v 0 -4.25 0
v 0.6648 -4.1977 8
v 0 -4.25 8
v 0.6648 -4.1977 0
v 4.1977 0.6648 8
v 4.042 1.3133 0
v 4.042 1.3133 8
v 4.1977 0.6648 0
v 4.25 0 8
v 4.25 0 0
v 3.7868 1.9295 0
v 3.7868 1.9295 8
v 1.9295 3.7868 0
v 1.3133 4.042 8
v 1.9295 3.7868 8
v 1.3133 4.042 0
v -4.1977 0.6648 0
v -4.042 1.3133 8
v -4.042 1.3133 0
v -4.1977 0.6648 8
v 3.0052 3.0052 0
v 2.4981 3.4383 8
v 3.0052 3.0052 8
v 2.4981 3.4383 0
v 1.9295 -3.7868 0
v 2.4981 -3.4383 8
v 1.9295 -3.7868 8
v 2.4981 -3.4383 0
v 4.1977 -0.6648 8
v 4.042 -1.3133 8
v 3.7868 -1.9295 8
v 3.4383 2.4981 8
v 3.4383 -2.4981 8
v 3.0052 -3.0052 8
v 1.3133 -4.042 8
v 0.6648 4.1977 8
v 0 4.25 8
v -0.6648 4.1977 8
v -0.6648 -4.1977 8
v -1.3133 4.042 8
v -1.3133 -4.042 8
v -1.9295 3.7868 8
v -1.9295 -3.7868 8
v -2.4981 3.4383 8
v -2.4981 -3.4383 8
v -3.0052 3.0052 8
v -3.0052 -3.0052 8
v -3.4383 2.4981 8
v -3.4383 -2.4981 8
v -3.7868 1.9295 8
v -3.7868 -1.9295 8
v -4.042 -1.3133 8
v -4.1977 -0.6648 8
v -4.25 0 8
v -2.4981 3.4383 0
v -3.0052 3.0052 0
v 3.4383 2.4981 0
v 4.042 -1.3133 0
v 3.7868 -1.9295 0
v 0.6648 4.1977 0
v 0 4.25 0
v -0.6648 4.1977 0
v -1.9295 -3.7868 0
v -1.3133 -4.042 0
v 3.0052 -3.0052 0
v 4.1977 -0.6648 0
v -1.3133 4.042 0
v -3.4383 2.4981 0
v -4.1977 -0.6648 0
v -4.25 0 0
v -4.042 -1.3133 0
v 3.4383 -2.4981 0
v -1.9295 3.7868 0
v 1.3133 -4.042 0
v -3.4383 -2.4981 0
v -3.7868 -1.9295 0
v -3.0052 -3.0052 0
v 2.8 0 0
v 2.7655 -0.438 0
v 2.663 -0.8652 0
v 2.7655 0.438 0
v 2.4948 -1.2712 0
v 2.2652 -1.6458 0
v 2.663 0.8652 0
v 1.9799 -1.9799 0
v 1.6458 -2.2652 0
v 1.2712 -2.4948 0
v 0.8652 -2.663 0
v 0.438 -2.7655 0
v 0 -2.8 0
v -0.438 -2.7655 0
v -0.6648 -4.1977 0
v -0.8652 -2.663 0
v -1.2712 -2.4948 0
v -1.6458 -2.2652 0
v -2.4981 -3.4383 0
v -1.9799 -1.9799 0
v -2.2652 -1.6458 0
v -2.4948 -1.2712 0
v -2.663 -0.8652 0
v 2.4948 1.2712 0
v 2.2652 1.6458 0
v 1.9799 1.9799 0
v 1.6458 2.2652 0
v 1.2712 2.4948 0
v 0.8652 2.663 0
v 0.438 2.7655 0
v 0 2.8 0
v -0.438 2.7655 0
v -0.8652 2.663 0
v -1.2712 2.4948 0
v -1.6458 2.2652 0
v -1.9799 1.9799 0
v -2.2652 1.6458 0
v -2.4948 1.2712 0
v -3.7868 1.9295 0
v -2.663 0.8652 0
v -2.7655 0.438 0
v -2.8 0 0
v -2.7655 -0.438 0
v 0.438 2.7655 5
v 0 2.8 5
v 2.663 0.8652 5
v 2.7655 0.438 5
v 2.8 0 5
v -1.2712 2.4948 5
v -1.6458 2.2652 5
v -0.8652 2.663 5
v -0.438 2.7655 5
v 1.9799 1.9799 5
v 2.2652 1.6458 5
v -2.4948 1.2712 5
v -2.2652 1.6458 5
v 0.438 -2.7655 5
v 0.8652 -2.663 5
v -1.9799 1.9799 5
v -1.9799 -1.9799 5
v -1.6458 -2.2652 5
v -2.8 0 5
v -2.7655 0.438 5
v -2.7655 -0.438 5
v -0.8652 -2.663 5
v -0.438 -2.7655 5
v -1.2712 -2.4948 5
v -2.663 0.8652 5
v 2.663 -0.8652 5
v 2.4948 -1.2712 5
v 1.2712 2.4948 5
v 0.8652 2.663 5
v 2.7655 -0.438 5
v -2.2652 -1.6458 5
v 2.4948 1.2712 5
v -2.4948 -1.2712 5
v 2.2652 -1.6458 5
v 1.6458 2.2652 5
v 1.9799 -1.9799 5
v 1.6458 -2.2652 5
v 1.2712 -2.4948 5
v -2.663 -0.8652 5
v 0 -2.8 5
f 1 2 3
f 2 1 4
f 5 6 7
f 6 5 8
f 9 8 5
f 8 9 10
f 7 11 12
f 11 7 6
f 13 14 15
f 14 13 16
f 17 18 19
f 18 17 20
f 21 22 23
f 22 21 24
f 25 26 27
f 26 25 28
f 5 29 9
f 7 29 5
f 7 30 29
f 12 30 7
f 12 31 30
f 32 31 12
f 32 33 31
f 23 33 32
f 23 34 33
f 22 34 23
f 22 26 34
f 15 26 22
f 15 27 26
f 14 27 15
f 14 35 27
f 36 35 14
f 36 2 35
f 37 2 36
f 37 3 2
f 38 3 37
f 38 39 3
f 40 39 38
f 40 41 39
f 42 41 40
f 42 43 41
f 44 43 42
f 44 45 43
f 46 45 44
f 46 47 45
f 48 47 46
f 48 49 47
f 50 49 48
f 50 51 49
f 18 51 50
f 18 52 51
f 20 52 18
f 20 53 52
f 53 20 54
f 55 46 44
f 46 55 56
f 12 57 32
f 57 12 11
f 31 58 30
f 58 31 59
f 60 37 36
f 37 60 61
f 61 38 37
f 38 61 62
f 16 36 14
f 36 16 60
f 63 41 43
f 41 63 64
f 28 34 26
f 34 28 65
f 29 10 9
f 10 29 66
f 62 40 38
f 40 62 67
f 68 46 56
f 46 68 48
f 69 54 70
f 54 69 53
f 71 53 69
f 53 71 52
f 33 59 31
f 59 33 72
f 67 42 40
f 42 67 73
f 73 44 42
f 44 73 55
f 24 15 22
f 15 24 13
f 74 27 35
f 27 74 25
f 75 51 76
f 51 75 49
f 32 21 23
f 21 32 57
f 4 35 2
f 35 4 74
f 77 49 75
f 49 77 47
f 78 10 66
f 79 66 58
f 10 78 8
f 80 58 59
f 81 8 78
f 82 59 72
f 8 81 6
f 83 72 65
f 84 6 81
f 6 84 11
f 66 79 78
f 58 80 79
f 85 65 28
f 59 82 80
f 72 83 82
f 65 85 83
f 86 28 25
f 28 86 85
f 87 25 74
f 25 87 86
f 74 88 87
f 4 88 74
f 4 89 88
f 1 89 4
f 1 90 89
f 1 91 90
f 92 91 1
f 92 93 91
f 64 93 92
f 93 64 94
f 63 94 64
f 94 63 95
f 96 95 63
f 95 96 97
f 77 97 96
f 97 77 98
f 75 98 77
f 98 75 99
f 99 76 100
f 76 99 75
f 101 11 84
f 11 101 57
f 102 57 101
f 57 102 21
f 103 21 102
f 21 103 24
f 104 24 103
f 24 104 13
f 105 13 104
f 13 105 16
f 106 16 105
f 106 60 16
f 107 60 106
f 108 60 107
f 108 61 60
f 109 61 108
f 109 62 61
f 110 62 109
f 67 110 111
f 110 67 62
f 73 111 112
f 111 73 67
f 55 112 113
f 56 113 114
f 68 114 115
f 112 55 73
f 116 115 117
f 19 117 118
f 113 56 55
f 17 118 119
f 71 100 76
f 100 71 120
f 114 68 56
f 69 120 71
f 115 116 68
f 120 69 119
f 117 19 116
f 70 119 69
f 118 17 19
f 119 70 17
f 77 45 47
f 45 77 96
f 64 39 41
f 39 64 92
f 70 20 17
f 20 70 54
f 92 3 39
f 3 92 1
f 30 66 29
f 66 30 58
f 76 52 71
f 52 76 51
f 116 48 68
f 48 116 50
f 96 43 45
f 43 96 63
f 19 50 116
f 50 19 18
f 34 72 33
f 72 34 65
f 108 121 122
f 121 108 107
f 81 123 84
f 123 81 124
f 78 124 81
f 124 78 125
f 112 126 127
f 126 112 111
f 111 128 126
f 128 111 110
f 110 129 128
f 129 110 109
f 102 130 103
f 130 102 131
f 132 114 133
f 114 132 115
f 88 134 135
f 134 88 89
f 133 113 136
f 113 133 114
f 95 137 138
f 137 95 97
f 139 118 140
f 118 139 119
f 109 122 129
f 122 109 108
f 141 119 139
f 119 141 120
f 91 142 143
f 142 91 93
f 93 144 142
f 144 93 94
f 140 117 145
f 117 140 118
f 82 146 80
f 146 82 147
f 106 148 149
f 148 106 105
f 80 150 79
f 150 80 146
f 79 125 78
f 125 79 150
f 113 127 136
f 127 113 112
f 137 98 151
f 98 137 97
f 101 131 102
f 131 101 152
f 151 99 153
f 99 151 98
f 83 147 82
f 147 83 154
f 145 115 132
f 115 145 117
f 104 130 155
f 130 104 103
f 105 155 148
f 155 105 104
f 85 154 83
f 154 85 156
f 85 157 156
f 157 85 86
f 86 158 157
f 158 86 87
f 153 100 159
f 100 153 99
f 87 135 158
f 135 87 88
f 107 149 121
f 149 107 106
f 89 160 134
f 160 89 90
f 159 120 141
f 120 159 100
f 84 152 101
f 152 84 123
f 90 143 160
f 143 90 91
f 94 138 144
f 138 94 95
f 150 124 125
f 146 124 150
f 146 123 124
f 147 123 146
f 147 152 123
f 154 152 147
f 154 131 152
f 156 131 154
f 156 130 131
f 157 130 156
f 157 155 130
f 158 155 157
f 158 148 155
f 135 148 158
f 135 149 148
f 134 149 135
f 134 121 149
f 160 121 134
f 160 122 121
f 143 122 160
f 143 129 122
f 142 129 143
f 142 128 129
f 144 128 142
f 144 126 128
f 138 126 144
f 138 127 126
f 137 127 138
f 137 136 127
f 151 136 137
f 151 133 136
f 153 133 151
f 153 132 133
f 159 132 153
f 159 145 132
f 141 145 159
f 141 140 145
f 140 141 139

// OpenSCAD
$fn = 40;

difference() {
    cylinder(h=8.0, d=8.5);
    cylinder(h=5.0, d=5.6);
}
